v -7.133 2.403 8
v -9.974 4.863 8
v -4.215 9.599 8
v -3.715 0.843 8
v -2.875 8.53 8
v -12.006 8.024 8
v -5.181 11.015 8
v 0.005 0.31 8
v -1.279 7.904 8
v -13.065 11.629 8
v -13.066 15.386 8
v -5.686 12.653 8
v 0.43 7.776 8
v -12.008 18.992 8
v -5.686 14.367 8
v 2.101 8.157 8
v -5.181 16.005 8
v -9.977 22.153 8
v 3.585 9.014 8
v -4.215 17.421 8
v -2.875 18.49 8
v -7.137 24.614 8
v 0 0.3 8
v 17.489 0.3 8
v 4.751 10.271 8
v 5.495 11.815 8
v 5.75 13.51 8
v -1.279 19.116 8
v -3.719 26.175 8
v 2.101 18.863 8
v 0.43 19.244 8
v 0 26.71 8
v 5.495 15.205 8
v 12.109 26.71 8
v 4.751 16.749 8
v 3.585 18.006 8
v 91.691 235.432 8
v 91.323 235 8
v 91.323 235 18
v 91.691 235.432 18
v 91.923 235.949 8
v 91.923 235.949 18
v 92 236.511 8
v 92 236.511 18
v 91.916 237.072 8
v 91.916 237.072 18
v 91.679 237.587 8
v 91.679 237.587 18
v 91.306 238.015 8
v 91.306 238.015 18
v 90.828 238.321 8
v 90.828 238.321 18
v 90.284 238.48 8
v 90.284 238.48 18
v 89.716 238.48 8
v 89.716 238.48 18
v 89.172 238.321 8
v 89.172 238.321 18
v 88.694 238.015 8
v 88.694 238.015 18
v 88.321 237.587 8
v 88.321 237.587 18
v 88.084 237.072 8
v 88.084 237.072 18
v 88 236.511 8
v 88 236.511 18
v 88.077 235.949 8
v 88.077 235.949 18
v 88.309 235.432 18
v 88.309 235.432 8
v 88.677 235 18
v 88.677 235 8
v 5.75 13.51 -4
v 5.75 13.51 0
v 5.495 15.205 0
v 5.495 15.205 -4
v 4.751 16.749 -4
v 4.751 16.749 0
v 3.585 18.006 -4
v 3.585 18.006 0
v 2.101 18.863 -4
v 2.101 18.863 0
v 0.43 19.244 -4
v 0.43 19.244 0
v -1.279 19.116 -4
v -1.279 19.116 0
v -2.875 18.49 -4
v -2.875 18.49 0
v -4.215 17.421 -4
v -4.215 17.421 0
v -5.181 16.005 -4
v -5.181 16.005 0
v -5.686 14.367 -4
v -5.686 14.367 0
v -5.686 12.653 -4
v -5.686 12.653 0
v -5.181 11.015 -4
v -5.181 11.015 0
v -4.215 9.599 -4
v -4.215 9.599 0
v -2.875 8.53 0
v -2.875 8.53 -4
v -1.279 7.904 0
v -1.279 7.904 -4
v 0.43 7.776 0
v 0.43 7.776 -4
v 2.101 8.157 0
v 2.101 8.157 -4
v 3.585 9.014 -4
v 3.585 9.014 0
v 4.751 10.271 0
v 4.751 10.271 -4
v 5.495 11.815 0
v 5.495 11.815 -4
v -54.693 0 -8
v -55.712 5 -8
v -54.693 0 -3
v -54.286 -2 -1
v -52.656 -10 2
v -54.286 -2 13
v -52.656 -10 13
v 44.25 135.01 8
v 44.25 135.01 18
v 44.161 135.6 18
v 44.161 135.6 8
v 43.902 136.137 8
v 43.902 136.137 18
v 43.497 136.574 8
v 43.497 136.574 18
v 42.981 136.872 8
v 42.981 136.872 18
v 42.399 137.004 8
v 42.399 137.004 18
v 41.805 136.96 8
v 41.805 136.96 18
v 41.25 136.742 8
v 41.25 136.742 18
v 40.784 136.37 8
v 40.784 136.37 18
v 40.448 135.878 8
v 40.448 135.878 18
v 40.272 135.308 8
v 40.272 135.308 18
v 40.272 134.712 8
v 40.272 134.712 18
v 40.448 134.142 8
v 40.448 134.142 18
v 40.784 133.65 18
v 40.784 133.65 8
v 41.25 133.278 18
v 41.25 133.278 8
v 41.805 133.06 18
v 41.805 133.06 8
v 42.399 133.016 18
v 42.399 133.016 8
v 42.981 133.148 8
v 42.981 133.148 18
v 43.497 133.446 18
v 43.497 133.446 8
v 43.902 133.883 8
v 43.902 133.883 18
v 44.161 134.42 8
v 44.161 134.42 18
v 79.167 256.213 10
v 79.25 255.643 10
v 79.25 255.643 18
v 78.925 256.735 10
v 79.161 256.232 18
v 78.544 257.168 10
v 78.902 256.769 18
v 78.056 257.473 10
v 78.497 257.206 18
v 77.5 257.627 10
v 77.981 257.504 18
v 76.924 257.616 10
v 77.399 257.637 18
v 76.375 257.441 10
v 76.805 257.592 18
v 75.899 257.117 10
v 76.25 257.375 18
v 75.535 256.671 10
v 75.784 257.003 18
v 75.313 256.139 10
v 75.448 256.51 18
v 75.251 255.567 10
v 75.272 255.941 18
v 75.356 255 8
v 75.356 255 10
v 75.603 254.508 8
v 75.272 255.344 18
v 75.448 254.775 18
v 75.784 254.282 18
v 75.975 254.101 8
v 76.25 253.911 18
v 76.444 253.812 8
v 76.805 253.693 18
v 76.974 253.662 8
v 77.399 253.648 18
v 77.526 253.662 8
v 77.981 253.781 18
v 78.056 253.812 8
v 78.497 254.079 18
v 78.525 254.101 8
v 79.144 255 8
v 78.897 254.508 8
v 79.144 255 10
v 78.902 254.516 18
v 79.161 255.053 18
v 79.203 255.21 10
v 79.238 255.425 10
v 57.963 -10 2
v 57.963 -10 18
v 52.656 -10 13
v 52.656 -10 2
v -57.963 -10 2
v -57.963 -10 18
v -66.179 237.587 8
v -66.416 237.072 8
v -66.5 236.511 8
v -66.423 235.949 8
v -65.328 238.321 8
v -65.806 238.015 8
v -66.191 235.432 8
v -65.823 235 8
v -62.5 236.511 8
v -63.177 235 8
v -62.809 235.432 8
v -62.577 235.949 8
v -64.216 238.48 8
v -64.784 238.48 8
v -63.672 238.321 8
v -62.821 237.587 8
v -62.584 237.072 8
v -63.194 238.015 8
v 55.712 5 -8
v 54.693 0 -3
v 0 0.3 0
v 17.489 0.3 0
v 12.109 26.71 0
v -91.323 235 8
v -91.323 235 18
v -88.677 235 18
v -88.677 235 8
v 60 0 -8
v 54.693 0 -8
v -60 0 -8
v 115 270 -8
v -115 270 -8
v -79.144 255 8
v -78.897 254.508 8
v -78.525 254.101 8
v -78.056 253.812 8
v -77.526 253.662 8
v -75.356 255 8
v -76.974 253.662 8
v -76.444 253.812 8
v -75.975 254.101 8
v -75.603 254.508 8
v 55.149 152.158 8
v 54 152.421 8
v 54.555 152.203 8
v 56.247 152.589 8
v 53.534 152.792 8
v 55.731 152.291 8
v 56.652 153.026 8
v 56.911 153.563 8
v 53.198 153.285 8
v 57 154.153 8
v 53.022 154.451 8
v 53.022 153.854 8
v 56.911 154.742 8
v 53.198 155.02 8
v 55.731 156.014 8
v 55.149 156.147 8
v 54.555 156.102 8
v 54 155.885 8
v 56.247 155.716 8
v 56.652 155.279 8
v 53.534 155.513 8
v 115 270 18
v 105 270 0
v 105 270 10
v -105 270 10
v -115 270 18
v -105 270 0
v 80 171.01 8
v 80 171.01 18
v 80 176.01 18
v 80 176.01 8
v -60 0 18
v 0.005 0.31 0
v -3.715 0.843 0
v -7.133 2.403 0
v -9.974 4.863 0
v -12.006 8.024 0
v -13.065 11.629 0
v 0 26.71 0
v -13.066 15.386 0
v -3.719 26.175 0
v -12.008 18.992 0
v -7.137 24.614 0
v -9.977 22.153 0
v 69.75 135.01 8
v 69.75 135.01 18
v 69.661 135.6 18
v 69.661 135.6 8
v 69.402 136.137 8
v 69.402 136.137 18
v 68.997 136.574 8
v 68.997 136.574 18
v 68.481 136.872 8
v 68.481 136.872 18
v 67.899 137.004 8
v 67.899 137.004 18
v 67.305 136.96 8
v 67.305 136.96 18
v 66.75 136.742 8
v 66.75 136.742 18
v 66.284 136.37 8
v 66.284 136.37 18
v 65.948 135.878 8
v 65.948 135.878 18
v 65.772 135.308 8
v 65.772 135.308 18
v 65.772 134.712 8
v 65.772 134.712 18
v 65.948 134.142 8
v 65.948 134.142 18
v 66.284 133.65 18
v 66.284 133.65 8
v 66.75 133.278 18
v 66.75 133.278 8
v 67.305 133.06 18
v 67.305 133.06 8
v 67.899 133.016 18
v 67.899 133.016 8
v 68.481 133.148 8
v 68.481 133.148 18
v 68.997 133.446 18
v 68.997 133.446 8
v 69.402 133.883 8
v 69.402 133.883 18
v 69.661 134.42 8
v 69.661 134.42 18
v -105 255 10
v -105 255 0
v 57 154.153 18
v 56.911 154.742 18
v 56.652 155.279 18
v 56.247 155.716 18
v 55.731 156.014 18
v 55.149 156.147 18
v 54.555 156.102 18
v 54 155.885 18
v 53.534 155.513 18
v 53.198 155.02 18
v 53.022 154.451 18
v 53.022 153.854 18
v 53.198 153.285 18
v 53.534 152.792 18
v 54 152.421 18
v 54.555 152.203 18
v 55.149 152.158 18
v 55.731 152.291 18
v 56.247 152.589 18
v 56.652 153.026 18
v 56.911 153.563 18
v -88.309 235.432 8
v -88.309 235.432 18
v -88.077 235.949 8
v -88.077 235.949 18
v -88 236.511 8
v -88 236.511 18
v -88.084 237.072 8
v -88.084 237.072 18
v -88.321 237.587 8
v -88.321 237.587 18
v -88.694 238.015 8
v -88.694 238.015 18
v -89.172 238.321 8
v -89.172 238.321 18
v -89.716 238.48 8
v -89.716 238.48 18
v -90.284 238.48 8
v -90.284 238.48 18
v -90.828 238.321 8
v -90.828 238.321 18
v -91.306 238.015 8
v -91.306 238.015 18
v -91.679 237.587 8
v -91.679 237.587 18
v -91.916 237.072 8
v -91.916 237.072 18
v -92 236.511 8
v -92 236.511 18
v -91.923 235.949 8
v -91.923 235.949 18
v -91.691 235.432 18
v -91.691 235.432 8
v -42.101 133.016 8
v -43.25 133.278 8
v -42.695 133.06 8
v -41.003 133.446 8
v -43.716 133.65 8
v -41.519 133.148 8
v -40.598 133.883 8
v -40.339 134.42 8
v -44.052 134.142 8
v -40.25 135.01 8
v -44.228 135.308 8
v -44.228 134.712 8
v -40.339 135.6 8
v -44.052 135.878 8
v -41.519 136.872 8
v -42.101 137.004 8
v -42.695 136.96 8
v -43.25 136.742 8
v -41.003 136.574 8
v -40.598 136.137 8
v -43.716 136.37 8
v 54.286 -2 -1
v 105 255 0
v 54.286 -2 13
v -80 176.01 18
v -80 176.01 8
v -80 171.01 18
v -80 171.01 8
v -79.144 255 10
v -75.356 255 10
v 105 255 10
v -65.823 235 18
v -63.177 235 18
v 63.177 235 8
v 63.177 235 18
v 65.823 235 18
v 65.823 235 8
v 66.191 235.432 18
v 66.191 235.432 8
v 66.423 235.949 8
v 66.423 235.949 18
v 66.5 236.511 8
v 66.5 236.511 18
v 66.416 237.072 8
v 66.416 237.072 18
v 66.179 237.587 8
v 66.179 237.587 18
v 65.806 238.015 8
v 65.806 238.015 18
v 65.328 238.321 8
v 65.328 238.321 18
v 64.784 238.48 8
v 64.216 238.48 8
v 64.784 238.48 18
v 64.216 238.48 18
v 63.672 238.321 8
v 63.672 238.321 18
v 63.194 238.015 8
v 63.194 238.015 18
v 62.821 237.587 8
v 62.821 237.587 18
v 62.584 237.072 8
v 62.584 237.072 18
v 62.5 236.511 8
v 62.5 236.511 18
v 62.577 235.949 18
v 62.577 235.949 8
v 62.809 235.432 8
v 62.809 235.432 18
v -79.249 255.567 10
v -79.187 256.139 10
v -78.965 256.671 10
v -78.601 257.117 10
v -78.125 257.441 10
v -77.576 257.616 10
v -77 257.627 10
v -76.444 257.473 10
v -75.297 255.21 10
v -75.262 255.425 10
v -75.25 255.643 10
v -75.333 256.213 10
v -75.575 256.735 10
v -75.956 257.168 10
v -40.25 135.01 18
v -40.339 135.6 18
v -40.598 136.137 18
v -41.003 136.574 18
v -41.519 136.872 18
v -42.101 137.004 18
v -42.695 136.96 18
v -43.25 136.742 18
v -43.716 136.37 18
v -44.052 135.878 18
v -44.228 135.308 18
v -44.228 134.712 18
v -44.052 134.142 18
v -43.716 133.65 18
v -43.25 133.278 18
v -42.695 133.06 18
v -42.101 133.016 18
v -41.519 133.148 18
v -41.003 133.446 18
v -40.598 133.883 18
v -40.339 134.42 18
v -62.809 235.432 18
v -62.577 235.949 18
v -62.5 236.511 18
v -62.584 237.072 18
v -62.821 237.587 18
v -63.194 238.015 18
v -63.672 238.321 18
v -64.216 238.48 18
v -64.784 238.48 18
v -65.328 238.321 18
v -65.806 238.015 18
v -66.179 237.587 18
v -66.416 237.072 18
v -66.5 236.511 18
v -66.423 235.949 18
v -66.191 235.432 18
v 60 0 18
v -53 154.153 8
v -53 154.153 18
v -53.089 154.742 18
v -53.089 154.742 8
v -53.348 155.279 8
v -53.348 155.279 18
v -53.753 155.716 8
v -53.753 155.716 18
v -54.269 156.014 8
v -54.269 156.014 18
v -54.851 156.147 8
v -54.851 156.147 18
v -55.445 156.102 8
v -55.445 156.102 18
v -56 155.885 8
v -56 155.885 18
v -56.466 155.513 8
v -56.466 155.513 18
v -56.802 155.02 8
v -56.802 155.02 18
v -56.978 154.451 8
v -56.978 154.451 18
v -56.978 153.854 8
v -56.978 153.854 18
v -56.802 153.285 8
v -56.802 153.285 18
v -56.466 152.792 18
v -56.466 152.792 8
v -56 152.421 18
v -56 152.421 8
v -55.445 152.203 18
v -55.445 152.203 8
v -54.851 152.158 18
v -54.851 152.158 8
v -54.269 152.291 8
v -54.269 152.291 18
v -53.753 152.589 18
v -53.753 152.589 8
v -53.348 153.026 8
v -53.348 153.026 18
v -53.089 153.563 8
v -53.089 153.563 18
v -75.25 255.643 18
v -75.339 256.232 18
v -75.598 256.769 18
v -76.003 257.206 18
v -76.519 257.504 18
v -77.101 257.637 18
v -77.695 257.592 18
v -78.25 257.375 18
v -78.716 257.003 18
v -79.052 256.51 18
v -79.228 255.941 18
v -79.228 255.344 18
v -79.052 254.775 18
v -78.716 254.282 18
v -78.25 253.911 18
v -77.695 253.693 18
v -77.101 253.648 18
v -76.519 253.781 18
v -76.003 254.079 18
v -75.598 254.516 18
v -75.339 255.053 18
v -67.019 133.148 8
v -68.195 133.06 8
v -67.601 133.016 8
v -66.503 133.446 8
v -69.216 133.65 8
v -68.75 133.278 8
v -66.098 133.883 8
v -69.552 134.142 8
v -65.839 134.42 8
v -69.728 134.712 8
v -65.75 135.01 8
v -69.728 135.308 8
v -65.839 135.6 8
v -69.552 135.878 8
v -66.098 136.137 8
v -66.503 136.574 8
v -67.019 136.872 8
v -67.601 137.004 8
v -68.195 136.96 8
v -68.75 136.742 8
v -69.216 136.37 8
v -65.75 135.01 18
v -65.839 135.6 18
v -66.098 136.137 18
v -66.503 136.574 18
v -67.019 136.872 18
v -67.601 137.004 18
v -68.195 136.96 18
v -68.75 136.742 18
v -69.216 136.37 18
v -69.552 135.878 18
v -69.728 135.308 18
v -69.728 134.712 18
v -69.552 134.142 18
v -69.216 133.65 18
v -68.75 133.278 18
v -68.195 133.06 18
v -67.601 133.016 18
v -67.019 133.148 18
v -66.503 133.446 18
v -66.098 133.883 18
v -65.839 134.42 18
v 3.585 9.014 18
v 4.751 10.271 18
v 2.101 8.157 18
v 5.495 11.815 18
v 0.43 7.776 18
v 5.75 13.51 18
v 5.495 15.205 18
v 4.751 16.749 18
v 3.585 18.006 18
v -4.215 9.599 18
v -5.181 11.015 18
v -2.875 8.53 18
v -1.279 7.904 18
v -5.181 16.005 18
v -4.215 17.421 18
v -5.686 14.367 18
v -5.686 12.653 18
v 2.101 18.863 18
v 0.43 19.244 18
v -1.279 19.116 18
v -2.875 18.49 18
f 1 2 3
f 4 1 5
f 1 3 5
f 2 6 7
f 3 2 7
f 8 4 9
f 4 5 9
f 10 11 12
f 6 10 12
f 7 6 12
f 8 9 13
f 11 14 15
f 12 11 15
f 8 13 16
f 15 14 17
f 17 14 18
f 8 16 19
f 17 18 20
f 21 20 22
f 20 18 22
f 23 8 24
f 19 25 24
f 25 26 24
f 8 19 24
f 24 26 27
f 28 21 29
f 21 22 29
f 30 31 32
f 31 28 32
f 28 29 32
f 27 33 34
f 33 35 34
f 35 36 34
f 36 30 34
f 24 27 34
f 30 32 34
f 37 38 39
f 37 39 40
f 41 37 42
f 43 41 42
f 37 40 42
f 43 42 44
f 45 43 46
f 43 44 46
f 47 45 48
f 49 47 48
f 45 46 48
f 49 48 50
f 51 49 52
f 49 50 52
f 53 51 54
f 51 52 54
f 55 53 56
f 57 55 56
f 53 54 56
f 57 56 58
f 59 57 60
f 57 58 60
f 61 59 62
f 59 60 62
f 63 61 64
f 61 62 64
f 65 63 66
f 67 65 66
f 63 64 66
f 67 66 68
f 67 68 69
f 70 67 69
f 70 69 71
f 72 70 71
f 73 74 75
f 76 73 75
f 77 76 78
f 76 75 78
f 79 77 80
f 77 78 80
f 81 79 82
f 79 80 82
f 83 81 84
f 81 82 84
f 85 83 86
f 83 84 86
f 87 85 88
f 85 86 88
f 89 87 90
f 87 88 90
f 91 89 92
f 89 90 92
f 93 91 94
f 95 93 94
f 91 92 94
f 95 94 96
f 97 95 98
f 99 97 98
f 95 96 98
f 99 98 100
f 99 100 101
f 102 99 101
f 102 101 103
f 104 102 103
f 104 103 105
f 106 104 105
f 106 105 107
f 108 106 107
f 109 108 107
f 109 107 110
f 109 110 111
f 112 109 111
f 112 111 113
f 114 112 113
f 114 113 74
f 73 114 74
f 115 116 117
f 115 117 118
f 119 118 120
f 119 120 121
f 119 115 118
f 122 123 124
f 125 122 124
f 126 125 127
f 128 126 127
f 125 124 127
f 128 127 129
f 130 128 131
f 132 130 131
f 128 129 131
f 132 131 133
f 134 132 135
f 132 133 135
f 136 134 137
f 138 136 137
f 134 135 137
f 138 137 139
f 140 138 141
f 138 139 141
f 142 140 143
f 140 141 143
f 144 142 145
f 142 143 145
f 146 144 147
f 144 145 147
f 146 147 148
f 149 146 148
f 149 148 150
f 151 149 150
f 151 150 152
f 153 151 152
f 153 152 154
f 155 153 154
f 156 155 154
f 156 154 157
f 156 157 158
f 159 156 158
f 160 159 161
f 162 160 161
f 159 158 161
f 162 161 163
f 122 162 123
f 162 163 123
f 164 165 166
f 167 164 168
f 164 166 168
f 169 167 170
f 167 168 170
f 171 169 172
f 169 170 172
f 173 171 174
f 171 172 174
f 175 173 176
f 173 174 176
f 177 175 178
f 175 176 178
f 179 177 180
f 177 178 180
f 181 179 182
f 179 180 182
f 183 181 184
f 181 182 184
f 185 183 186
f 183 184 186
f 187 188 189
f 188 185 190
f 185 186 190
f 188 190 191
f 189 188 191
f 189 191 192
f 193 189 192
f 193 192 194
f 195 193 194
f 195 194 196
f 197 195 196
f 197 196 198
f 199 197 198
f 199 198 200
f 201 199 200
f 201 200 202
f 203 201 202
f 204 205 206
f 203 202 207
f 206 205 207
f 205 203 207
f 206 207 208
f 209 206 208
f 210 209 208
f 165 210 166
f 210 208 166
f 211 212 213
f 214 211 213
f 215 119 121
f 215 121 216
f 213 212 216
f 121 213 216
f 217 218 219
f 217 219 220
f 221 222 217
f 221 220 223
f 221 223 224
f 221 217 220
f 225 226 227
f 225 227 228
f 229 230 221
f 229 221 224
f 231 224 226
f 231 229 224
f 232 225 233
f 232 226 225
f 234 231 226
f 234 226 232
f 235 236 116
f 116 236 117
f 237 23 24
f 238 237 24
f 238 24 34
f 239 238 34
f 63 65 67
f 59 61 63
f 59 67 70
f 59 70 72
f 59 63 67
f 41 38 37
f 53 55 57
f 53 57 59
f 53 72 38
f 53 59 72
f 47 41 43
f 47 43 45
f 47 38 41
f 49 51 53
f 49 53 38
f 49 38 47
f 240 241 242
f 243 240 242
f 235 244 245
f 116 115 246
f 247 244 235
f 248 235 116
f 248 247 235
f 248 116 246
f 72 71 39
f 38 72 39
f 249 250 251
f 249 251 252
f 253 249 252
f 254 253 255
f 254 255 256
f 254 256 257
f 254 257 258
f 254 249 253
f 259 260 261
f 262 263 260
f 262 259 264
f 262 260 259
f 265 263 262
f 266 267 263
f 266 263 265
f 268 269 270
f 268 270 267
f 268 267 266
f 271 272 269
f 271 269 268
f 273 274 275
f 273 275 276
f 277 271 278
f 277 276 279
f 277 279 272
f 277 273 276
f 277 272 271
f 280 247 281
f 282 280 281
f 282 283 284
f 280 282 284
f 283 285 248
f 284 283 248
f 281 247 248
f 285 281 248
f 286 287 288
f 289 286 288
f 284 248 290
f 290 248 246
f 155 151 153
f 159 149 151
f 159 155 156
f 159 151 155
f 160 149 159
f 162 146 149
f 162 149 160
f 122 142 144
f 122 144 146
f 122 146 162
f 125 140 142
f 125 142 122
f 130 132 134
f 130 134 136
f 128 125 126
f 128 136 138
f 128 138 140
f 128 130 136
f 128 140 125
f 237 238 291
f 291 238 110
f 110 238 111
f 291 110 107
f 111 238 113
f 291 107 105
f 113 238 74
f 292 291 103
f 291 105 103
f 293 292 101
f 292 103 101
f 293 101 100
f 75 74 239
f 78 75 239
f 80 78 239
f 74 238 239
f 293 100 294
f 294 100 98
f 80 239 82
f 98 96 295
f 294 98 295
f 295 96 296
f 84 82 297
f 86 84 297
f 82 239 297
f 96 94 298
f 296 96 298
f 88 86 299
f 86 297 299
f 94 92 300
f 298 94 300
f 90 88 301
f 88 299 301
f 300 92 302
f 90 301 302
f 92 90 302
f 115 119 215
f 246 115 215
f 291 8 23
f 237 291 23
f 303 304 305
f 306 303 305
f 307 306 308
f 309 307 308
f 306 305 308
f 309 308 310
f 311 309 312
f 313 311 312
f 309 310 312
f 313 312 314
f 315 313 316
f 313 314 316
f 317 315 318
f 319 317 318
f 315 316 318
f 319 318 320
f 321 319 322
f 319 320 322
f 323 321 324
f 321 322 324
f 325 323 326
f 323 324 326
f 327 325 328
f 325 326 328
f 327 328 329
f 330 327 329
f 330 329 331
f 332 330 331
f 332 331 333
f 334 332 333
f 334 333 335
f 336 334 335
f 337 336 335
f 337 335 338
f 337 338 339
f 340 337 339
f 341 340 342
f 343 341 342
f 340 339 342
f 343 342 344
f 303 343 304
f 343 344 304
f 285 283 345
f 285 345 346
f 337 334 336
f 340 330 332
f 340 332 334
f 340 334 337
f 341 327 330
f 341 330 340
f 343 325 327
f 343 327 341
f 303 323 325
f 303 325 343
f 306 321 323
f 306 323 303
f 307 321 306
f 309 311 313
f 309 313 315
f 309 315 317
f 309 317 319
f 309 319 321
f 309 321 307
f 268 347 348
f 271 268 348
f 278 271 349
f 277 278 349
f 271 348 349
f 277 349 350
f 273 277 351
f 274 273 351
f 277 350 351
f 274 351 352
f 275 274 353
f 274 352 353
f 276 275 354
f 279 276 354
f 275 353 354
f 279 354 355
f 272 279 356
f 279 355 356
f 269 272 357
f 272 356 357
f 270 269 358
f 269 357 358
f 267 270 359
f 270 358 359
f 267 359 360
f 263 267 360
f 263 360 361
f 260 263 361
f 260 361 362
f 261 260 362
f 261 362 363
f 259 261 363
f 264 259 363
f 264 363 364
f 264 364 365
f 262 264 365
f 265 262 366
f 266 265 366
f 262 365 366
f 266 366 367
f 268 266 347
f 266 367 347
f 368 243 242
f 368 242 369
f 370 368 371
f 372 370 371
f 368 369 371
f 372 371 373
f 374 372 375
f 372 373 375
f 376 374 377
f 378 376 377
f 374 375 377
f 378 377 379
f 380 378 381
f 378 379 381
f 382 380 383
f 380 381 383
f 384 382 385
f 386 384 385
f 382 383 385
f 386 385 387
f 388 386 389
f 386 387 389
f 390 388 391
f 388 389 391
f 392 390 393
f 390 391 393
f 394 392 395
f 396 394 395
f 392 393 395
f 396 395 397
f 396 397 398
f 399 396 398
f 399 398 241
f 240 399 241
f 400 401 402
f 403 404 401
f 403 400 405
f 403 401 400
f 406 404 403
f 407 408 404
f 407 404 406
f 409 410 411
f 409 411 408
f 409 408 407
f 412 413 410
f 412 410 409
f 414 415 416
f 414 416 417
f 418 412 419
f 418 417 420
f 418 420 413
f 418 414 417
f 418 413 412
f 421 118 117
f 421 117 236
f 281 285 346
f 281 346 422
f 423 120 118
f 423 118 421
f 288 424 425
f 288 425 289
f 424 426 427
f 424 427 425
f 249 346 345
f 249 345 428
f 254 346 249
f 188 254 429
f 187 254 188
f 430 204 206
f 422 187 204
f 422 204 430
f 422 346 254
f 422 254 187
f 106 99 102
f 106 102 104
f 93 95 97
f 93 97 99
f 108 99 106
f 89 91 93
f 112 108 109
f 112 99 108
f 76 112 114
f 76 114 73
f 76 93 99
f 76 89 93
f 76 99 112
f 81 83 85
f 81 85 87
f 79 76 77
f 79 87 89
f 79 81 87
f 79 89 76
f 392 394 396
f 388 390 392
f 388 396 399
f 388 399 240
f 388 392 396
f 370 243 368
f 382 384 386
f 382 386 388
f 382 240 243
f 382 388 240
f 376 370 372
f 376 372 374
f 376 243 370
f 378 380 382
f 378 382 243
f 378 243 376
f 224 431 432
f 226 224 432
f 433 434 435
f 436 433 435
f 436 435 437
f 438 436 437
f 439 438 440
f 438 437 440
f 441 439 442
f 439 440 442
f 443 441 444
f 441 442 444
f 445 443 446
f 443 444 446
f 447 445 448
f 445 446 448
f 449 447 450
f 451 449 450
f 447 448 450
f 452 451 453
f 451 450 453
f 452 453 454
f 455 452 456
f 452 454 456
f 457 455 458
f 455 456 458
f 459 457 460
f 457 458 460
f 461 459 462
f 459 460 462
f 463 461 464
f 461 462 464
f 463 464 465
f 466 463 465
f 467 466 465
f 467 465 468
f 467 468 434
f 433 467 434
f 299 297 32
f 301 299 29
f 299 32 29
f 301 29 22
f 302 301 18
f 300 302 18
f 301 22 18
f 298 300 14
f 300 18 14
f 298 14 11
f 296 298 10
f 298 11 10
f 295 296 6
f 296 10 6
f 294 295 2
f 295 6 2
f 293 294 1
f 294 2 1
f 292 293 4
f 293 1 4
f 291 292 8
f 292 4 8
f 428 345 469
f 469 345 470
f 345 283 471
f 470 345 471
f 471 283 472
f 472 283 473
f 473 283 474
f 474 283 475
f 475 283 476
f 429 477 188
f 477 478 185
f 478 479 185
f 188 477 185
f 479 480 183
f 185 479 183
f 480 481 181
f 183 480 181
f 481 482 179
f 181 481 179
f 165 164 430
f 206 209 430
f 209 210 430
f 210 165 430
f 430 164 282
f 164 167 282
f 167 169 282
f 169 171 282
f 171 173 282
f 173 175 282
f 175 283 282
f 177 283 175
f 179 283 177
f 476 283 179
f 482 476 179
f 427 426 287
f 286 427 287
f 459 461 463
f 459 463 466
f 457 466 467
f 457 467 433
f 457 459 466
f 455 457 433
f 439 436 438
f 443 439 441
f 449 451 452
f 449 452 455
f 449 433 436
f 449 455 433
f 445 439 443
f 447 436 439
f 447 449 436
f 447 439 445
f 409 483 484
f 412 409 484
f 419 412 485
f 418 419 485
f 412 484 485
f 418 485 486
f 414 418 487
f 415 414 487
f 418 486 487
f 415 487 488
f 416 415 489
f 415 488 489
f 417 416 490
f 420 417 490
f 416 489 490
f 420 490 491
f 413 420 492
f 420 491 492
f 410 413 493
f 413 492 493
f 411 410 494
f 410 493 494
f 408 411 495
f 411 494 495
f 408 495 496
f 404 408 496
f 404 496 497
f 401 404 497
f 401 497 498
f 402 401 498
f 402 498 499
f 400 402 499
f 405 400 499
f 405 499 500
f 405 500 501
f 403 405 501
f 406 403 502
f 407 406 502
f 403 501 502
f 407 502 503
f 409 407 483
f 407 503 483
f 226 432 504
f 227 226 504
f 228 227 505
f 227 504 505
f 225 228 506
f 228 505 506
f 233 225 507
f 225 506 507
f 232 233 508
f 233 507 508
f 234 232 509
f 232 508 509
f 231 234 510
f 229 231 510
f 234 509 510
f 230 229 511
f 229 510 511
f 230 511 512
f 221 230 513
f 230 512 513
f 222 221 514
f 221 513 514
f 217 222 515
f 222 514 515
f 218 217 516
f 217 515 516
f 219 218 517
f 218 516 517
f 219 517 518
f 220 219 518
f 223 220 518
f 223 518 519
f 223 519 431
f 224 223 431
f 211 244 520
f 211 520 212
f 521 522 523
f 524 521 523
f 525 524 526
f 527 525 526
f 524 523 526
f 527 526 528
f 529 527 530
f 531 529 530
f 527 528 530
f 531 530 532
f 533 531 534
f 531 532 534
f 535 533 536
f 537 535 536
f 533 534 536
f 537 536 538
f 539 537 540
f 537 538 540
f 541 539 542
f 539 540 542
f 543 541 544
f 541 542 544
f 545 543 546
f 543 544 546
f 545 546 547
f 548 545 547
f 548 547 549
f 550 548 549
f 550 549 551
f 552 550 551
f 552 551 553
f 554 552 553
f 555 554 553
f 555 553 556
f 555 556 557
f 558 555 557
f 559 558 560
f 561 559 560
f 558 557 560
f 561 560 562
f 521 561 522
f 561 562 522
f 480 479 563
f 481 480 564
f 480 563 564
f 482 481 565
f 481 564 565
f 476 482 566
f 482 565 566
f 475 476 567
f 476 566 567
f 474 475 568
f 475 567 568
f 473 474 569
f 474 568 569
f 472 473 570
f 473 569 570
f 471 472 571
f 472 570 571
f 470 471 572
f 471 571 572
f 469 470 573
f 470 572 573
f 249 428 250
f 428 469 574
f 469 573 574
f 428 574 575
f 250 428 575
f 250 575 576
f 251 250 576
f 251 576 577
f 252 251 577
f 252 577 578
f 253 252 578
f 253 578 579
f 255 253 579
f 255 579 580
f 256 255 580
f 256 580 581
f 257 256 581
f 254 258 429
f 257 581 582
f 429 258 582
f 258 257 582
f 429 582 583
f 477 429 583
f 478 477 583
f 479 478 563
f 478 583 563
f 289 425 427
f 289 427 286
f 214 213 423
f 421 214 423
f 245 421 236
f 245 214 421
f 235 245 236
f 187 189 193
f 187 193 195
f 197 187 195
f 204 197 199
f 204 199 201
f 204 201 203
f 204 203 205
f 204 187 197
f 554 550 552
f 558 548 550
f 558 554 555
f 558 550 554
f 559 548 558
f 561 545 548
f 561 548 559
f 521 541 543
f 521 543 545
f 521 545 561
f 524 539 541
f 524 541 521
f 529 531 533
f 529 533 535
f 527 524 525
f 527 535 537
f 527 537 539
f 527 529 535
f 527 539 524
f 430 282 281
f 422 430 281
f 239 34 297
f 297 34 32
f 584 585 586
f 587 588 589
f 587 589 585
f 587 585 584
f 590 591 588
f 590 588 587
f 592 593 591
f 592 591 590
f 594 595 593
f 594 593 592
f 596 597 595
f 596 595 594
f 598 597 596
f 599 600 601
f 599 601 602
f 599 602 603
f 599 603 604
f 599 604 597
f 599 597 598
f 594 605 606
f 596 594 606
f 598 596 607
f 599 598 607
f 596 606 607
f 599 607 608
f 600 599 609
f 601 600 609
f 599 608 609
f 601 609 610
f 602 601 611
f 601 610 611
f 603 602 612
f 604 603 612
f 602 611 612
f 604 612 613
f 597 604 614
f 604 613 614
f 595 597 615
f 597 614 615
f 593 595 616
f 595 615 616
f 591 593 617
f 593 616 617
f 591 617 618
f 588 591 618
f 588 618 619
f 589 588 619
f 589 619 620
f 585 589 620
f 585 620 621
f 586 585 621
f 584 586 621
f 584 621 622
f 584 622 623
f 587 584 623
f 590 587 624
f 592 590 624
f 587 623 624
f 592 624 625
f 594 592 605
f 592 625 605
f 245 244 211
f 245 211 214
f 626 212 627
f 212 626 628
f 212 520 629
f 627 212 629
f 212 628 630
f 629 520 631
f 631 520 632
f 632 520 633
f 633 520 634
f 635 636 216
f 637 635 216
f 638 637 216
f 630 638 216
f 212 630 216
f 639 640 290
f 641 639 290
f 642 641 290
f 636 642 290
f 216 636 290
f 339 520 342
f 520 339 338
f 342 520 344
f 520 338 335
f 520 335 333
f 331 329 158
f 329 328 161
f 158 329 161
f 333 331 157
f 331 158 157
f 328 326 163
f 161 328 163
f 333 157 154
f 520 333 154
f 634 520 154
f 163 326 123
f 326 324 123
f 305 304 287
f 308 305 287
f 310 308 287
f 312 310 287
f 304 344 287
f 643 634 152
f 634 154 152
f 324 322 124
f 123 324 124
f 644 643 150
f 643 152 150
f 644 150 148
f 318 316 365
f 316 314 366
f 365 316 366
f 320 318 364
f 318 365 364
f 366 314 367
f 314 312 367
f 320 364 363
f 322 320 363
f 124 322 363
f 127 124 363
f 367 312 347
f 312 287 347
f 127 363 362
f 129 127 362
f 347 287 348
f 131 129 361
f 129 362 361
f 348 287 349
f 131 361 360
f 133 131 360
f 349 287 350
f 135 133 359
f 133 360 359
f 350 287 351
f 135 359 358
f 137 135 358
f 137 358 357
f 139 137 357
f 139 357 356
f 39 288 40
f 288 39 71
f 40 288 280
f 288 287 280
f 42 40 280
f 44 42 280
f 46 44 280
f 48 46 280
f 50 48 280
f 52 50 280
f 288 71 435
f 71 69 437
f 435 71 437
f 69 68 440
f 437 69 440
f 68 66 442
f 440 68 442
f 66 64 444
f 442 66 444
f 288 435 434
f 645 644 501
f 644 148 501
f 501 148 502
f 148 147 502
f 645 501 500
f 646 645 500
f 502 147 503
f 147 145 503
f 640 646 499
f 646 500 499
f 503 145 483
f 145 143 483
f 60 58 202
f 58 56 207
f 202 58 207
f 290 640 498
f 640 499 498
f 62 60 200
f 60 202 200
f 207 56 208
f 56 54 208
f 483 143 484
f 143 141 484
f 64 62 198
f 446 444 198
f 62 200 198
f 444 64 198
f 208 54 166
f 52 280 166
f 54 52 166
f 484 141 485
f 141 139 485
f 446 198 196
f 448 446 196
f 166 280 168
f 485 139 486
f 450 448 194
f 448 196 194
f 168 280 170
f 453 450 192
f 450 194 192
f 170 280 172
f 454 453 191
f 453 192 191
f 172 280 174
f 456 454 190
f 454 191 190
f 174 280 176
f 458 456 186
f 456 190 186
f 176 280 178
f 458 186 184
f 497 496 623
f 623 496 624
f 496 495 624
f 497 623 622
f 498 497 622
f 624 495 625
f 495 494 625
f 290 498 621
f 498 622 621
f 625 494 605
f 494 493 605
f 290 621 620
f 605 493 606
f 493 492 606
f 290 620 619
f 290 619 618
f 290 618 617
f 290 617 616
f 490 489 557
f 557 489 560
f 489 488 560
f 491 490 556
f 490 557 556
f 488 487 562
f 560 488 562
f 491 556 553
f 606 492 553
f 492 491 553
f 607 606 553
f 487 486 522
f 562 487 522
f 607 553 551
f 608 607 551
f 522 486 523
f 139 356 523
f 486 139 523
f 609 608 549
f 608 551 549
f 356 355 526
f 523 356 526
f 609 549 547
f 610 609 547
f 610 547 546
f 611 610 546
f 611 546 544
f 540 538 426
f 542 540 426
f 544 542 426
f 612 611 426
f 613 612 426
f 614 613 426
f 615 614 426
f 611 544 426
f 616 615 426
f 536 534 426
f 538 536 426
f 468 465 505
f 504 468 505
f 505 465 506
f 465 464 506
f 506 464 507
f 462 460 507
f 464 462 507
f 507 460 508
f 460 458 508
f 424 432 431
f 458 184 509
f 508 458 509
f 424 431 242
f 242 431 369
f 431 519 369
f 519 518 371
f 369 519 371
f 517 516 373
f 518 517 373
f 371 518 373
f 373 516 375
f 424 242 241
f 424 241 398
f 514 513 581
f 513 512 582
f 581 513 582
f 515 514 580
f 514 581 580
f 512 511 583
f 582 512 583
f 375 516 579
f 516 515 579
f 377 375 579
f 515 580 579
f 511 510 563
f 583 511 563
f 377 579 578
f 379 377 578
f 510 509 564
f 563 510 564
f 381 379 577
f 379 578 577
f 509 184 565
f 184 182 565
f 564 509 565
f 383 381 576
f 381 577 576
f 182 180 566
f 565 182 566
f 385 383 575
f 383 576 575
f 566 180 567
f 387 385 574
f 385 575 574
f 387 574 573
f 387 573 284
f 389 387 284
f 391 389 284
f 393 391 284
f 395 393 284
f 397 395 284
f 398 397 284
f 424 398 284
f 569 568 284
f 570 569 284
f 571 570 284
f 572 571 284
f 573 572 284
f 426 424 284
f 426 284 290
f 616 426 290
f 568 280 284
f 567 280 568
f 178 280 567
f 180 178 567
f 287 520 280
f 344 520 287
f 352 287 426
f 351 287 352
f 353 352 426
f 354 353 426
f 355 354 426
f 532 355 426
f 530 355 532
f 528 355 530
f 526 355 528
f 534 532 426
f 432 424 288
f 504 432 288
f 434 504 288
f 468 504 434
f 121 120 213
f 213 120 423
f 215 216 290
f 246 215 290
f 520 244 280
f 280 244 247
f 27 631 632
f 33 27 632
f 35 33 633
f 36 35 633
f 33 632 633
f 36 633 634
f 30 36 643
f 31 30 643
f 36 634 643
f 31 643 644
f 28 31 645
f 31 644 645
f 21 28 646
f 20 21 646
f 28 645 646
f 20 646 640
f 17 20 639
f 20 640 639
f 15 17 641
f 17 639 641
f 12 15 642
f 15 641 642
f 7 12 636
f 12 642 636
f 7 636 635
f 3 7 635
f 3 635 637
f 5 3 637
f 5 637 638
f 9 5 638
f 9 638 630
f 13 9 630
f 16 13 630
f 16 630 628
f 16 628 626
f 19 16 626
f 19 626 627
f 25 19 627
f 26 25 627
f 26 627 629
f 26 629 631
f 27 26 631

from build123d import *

# Parameters (mm, degrees)
EXTRUDE_1_DEPTH     = 8
CUT_EXTRUDE_1_DEPTH = 8.6
EXTRUDE_2_DEPTH     = 8
EXTRUDE_3_DEPTH     = 10
SKETCH_7_R          = 5.75
CUT_EXTRUDE_2_DEPTH = 22
EXTRUDE_5_DEPTH     = 26
CUT_EXTRUDE_4_DEPTH = 21
CHAMFER_6_SIZE      = 5
CHAMFER_8_SIZE      = 10
SKETCH_13_W         = 210
SKETCH_13_H         = 10
CUT_EXTRUDE_5_DEPTH = 15
SKETCH_14_W         = 160
SKETCH_14_H         = 5
CUT_EXTRUDE_6_DEPTH = 10
SKETCH_16_R         = 2
CUT_EXTRUDE_7_DEPTH = 10
SKETCH_18_W         = 109.386418102
SKETCH_18_H         = 16
EXTRUDE_7_DEPTH     = 2
CHAMFER_10_SIZE     = 2


with BuildPart() as part:
    # 草图1 → 凸台-拉伸1 (new body)
    with BuildSketch(Plane.XY):
        Polygon((-60, 0), (60, 0), (115, 270), (-115, 270), align=None)
    extrude(amount=EXTRUDE_1_DEPTH)

    # 草图2 → 切除-拉伸1 (cut)
    with BuildSketch(Plane.XY.offset(8)):
        with BuildLine():
            Line((0.005000474, 0.310000947), (0, 0.3))
            Line((0, 0.3), (17.48870838, 0.3))
            Line((17.48870838, 0.3), (12.108893566, 26.71))
            Line((12.108893566, 26.71), (0, 26.71))
            ThreePointArc((0, 26.71), (-13.199999763, 13.507499763), (0.005000474, 0.310000947))
        make_face()
    extrude(amount=-CUT_EXTRUDE_1_DEPTH, mode=Mode.SUBTRACT)

    # 草图5 → 凸台-拉伸2 (add)
    with BuildSketch(Plane(origin=(0, 0, 0), x_dir=(-1, 0, 0), z_dir=(0, 0, -1))):
        Polygon((60, 0), (115, 270), (-115, 270), (-60, 0), align=None)
    extrude(amount=EXTRUDE_2_DEPTH)

    # 草图6 → 凸台-拉伸3 (add)
    with BuildSketch(Plane.XY.offset(8)):
        Polygon((-115, 270), (-60, 0), (60, 0), (115, 270), align=None)
    extrude(amount=EXTRUDE_3_DEPTH)

    # 草图7 → 切除-拉伸2 (cut)
    with BuildSketch(Plane.XY.offset(18)):
        with Locations((0, 13.51)):
            Circle(SKETCH_7_R)
    extrude(amount=-CUT_EXTRUDE_2_DEPTH, mode=Mode.SUBTRACT)

    # 草图9 → 凸台-拉伸5 (add)
    with BuildSketch(Plane.XY.offset(18)):
        Polygon((-57.962962963, -10), (-60, 0), (60, 0), (57.962962963, -10), align=None)
    extrude(amount=-EXTRUDE_5_DEPTH)

    # 草图12 → 切除-拉伸4 (cut)
    with BuildSketch(Plane.XY.offset(-8)):
        Polygon((54.693209051, 0), (-54.693209051, 0), (-52.656172014, -10), (52.656172014, -10), align=None)
    extrude(amount=CUT_EXTRUDE_4_DEPTH, mode=Mode.SUBTRACT)

    # 倒角6
    chamfer_6_edges = [part.edges().sort_by_distance(p)[0] for p in [
        (0, 0, -8),
    ]]
    chamfer(chamfer_6_edges, length=CHAMFER_6_SIZE)

    # 倒角8
    chamfer_8_edges = [part.edges().sort_by_distance(p)[0] for p in [
        (55.309567488, -10, -8),
        (-55.309567488, -10, -8),
    ]]
    chamfer(chamfer_8_edges, length=CHAMFER_8_SIZE)

    # 草图13 → 切除-拉伸5 (cut)
    with BuildSketch(Plane(origin=(0, 270, 0), x_dir=(1, 0, 0), z_dir=(0, 1, 0))):
        with Locations((0, -5)):
            Rectangle(SKETCH_13_W, SKETCH_13_H)
    extrude(amount=-CUT_EXTRUDE_5_DEPTH, mode=Mode.SUBTRACT)

    # 草图14 → 切除-拉伸6 (cut)
    with BuildSketch(Plane.XY.offset(18)):
        with Locations((0, 173.51)):
            Rectangle(SKETCH_14_W, SKETCH_14_H)
    extrude(amount=-CUT_EXTRUDE_6_DEPTH, mode=Mode.SUBTRACT)

    # 草图16 → 切除-拉伸7 (cut)
    with BuildSketch(Plane.XY.offset(18)):
        with BuildLine():
            ThreePointArc((-88.677124344, 235), (-90, 238.5), (-91.322875656, 235))
            Line((-91.322875656, 235), (-88.677124344, 235))
        make_face()
        with BuildLine():
            ThreePointArc((91.322875656, 235), (90, 238.5), (88.677124344, 235))
            Line((88.677124344, 235), (91.322875656, 235))
        make_face()
        with BuildLine():
            ThreePointArc((65.822875656, 235), (64.5, 238.5), (63.177124344, 235))
            Line((63.177124344, 235), (65.822875656, 235))
        make_face()
        with BuildLine():
            ThreePointArc((-63.177124344, 235), (-64.5, 238.5), (-65.822875656, 235))
            Line((-65.822875656, 235), (-63.177124344, 235))
        make_face()
        with Locations((-77.25, 255.6425573)):
            Circle(SKETCH_16_R)
        with Locations((77.25, 255.6425573)):
            Circle(SKETCH_16_R)
        with Locations((-55, 154.1525573)):
            Circle(SKETCH_16_R)
        with Locations((-67.75, 135.01)):
            Circle(SKETCH_16_R)
        with Locations((-42.25, 135.01)):
            Circle(SKETCH_16_R)
        with Locations((42.25, 135.01)):
            Circle(SKETCH_16_R)
        with Locations((67.75, 135.01)):
            Circle(SKETCH_16_R)
        with Locations((55, 154.1525573)):
            Circle(SKETCH_16_R)
    extrude(amount=-CUT_EXTRUDE_7_DEPTH, mode=Mode.SUBTRACT)

    # 草图18 → 凸台-拉伸7 (add)
    with BuildSketch(Plane.XZ):
        with Locations((0, 5)):
            Rectangle(SKETCH_18_W, SKETCH_18_H)
    extrude(amount=EXTRUDE_7_DEPTH)

    # 倒角10
    chamfer_10_edges = [part.edges().sort_by_distance(p)[0] for p in [
        (0, -2, -3),
    ]]
    chamfer(chamfer_10_edges, length=CHAMFER_10_SIZE - 0.0001)  # a hair under: the kernel refuses the full size


solid = part.part
